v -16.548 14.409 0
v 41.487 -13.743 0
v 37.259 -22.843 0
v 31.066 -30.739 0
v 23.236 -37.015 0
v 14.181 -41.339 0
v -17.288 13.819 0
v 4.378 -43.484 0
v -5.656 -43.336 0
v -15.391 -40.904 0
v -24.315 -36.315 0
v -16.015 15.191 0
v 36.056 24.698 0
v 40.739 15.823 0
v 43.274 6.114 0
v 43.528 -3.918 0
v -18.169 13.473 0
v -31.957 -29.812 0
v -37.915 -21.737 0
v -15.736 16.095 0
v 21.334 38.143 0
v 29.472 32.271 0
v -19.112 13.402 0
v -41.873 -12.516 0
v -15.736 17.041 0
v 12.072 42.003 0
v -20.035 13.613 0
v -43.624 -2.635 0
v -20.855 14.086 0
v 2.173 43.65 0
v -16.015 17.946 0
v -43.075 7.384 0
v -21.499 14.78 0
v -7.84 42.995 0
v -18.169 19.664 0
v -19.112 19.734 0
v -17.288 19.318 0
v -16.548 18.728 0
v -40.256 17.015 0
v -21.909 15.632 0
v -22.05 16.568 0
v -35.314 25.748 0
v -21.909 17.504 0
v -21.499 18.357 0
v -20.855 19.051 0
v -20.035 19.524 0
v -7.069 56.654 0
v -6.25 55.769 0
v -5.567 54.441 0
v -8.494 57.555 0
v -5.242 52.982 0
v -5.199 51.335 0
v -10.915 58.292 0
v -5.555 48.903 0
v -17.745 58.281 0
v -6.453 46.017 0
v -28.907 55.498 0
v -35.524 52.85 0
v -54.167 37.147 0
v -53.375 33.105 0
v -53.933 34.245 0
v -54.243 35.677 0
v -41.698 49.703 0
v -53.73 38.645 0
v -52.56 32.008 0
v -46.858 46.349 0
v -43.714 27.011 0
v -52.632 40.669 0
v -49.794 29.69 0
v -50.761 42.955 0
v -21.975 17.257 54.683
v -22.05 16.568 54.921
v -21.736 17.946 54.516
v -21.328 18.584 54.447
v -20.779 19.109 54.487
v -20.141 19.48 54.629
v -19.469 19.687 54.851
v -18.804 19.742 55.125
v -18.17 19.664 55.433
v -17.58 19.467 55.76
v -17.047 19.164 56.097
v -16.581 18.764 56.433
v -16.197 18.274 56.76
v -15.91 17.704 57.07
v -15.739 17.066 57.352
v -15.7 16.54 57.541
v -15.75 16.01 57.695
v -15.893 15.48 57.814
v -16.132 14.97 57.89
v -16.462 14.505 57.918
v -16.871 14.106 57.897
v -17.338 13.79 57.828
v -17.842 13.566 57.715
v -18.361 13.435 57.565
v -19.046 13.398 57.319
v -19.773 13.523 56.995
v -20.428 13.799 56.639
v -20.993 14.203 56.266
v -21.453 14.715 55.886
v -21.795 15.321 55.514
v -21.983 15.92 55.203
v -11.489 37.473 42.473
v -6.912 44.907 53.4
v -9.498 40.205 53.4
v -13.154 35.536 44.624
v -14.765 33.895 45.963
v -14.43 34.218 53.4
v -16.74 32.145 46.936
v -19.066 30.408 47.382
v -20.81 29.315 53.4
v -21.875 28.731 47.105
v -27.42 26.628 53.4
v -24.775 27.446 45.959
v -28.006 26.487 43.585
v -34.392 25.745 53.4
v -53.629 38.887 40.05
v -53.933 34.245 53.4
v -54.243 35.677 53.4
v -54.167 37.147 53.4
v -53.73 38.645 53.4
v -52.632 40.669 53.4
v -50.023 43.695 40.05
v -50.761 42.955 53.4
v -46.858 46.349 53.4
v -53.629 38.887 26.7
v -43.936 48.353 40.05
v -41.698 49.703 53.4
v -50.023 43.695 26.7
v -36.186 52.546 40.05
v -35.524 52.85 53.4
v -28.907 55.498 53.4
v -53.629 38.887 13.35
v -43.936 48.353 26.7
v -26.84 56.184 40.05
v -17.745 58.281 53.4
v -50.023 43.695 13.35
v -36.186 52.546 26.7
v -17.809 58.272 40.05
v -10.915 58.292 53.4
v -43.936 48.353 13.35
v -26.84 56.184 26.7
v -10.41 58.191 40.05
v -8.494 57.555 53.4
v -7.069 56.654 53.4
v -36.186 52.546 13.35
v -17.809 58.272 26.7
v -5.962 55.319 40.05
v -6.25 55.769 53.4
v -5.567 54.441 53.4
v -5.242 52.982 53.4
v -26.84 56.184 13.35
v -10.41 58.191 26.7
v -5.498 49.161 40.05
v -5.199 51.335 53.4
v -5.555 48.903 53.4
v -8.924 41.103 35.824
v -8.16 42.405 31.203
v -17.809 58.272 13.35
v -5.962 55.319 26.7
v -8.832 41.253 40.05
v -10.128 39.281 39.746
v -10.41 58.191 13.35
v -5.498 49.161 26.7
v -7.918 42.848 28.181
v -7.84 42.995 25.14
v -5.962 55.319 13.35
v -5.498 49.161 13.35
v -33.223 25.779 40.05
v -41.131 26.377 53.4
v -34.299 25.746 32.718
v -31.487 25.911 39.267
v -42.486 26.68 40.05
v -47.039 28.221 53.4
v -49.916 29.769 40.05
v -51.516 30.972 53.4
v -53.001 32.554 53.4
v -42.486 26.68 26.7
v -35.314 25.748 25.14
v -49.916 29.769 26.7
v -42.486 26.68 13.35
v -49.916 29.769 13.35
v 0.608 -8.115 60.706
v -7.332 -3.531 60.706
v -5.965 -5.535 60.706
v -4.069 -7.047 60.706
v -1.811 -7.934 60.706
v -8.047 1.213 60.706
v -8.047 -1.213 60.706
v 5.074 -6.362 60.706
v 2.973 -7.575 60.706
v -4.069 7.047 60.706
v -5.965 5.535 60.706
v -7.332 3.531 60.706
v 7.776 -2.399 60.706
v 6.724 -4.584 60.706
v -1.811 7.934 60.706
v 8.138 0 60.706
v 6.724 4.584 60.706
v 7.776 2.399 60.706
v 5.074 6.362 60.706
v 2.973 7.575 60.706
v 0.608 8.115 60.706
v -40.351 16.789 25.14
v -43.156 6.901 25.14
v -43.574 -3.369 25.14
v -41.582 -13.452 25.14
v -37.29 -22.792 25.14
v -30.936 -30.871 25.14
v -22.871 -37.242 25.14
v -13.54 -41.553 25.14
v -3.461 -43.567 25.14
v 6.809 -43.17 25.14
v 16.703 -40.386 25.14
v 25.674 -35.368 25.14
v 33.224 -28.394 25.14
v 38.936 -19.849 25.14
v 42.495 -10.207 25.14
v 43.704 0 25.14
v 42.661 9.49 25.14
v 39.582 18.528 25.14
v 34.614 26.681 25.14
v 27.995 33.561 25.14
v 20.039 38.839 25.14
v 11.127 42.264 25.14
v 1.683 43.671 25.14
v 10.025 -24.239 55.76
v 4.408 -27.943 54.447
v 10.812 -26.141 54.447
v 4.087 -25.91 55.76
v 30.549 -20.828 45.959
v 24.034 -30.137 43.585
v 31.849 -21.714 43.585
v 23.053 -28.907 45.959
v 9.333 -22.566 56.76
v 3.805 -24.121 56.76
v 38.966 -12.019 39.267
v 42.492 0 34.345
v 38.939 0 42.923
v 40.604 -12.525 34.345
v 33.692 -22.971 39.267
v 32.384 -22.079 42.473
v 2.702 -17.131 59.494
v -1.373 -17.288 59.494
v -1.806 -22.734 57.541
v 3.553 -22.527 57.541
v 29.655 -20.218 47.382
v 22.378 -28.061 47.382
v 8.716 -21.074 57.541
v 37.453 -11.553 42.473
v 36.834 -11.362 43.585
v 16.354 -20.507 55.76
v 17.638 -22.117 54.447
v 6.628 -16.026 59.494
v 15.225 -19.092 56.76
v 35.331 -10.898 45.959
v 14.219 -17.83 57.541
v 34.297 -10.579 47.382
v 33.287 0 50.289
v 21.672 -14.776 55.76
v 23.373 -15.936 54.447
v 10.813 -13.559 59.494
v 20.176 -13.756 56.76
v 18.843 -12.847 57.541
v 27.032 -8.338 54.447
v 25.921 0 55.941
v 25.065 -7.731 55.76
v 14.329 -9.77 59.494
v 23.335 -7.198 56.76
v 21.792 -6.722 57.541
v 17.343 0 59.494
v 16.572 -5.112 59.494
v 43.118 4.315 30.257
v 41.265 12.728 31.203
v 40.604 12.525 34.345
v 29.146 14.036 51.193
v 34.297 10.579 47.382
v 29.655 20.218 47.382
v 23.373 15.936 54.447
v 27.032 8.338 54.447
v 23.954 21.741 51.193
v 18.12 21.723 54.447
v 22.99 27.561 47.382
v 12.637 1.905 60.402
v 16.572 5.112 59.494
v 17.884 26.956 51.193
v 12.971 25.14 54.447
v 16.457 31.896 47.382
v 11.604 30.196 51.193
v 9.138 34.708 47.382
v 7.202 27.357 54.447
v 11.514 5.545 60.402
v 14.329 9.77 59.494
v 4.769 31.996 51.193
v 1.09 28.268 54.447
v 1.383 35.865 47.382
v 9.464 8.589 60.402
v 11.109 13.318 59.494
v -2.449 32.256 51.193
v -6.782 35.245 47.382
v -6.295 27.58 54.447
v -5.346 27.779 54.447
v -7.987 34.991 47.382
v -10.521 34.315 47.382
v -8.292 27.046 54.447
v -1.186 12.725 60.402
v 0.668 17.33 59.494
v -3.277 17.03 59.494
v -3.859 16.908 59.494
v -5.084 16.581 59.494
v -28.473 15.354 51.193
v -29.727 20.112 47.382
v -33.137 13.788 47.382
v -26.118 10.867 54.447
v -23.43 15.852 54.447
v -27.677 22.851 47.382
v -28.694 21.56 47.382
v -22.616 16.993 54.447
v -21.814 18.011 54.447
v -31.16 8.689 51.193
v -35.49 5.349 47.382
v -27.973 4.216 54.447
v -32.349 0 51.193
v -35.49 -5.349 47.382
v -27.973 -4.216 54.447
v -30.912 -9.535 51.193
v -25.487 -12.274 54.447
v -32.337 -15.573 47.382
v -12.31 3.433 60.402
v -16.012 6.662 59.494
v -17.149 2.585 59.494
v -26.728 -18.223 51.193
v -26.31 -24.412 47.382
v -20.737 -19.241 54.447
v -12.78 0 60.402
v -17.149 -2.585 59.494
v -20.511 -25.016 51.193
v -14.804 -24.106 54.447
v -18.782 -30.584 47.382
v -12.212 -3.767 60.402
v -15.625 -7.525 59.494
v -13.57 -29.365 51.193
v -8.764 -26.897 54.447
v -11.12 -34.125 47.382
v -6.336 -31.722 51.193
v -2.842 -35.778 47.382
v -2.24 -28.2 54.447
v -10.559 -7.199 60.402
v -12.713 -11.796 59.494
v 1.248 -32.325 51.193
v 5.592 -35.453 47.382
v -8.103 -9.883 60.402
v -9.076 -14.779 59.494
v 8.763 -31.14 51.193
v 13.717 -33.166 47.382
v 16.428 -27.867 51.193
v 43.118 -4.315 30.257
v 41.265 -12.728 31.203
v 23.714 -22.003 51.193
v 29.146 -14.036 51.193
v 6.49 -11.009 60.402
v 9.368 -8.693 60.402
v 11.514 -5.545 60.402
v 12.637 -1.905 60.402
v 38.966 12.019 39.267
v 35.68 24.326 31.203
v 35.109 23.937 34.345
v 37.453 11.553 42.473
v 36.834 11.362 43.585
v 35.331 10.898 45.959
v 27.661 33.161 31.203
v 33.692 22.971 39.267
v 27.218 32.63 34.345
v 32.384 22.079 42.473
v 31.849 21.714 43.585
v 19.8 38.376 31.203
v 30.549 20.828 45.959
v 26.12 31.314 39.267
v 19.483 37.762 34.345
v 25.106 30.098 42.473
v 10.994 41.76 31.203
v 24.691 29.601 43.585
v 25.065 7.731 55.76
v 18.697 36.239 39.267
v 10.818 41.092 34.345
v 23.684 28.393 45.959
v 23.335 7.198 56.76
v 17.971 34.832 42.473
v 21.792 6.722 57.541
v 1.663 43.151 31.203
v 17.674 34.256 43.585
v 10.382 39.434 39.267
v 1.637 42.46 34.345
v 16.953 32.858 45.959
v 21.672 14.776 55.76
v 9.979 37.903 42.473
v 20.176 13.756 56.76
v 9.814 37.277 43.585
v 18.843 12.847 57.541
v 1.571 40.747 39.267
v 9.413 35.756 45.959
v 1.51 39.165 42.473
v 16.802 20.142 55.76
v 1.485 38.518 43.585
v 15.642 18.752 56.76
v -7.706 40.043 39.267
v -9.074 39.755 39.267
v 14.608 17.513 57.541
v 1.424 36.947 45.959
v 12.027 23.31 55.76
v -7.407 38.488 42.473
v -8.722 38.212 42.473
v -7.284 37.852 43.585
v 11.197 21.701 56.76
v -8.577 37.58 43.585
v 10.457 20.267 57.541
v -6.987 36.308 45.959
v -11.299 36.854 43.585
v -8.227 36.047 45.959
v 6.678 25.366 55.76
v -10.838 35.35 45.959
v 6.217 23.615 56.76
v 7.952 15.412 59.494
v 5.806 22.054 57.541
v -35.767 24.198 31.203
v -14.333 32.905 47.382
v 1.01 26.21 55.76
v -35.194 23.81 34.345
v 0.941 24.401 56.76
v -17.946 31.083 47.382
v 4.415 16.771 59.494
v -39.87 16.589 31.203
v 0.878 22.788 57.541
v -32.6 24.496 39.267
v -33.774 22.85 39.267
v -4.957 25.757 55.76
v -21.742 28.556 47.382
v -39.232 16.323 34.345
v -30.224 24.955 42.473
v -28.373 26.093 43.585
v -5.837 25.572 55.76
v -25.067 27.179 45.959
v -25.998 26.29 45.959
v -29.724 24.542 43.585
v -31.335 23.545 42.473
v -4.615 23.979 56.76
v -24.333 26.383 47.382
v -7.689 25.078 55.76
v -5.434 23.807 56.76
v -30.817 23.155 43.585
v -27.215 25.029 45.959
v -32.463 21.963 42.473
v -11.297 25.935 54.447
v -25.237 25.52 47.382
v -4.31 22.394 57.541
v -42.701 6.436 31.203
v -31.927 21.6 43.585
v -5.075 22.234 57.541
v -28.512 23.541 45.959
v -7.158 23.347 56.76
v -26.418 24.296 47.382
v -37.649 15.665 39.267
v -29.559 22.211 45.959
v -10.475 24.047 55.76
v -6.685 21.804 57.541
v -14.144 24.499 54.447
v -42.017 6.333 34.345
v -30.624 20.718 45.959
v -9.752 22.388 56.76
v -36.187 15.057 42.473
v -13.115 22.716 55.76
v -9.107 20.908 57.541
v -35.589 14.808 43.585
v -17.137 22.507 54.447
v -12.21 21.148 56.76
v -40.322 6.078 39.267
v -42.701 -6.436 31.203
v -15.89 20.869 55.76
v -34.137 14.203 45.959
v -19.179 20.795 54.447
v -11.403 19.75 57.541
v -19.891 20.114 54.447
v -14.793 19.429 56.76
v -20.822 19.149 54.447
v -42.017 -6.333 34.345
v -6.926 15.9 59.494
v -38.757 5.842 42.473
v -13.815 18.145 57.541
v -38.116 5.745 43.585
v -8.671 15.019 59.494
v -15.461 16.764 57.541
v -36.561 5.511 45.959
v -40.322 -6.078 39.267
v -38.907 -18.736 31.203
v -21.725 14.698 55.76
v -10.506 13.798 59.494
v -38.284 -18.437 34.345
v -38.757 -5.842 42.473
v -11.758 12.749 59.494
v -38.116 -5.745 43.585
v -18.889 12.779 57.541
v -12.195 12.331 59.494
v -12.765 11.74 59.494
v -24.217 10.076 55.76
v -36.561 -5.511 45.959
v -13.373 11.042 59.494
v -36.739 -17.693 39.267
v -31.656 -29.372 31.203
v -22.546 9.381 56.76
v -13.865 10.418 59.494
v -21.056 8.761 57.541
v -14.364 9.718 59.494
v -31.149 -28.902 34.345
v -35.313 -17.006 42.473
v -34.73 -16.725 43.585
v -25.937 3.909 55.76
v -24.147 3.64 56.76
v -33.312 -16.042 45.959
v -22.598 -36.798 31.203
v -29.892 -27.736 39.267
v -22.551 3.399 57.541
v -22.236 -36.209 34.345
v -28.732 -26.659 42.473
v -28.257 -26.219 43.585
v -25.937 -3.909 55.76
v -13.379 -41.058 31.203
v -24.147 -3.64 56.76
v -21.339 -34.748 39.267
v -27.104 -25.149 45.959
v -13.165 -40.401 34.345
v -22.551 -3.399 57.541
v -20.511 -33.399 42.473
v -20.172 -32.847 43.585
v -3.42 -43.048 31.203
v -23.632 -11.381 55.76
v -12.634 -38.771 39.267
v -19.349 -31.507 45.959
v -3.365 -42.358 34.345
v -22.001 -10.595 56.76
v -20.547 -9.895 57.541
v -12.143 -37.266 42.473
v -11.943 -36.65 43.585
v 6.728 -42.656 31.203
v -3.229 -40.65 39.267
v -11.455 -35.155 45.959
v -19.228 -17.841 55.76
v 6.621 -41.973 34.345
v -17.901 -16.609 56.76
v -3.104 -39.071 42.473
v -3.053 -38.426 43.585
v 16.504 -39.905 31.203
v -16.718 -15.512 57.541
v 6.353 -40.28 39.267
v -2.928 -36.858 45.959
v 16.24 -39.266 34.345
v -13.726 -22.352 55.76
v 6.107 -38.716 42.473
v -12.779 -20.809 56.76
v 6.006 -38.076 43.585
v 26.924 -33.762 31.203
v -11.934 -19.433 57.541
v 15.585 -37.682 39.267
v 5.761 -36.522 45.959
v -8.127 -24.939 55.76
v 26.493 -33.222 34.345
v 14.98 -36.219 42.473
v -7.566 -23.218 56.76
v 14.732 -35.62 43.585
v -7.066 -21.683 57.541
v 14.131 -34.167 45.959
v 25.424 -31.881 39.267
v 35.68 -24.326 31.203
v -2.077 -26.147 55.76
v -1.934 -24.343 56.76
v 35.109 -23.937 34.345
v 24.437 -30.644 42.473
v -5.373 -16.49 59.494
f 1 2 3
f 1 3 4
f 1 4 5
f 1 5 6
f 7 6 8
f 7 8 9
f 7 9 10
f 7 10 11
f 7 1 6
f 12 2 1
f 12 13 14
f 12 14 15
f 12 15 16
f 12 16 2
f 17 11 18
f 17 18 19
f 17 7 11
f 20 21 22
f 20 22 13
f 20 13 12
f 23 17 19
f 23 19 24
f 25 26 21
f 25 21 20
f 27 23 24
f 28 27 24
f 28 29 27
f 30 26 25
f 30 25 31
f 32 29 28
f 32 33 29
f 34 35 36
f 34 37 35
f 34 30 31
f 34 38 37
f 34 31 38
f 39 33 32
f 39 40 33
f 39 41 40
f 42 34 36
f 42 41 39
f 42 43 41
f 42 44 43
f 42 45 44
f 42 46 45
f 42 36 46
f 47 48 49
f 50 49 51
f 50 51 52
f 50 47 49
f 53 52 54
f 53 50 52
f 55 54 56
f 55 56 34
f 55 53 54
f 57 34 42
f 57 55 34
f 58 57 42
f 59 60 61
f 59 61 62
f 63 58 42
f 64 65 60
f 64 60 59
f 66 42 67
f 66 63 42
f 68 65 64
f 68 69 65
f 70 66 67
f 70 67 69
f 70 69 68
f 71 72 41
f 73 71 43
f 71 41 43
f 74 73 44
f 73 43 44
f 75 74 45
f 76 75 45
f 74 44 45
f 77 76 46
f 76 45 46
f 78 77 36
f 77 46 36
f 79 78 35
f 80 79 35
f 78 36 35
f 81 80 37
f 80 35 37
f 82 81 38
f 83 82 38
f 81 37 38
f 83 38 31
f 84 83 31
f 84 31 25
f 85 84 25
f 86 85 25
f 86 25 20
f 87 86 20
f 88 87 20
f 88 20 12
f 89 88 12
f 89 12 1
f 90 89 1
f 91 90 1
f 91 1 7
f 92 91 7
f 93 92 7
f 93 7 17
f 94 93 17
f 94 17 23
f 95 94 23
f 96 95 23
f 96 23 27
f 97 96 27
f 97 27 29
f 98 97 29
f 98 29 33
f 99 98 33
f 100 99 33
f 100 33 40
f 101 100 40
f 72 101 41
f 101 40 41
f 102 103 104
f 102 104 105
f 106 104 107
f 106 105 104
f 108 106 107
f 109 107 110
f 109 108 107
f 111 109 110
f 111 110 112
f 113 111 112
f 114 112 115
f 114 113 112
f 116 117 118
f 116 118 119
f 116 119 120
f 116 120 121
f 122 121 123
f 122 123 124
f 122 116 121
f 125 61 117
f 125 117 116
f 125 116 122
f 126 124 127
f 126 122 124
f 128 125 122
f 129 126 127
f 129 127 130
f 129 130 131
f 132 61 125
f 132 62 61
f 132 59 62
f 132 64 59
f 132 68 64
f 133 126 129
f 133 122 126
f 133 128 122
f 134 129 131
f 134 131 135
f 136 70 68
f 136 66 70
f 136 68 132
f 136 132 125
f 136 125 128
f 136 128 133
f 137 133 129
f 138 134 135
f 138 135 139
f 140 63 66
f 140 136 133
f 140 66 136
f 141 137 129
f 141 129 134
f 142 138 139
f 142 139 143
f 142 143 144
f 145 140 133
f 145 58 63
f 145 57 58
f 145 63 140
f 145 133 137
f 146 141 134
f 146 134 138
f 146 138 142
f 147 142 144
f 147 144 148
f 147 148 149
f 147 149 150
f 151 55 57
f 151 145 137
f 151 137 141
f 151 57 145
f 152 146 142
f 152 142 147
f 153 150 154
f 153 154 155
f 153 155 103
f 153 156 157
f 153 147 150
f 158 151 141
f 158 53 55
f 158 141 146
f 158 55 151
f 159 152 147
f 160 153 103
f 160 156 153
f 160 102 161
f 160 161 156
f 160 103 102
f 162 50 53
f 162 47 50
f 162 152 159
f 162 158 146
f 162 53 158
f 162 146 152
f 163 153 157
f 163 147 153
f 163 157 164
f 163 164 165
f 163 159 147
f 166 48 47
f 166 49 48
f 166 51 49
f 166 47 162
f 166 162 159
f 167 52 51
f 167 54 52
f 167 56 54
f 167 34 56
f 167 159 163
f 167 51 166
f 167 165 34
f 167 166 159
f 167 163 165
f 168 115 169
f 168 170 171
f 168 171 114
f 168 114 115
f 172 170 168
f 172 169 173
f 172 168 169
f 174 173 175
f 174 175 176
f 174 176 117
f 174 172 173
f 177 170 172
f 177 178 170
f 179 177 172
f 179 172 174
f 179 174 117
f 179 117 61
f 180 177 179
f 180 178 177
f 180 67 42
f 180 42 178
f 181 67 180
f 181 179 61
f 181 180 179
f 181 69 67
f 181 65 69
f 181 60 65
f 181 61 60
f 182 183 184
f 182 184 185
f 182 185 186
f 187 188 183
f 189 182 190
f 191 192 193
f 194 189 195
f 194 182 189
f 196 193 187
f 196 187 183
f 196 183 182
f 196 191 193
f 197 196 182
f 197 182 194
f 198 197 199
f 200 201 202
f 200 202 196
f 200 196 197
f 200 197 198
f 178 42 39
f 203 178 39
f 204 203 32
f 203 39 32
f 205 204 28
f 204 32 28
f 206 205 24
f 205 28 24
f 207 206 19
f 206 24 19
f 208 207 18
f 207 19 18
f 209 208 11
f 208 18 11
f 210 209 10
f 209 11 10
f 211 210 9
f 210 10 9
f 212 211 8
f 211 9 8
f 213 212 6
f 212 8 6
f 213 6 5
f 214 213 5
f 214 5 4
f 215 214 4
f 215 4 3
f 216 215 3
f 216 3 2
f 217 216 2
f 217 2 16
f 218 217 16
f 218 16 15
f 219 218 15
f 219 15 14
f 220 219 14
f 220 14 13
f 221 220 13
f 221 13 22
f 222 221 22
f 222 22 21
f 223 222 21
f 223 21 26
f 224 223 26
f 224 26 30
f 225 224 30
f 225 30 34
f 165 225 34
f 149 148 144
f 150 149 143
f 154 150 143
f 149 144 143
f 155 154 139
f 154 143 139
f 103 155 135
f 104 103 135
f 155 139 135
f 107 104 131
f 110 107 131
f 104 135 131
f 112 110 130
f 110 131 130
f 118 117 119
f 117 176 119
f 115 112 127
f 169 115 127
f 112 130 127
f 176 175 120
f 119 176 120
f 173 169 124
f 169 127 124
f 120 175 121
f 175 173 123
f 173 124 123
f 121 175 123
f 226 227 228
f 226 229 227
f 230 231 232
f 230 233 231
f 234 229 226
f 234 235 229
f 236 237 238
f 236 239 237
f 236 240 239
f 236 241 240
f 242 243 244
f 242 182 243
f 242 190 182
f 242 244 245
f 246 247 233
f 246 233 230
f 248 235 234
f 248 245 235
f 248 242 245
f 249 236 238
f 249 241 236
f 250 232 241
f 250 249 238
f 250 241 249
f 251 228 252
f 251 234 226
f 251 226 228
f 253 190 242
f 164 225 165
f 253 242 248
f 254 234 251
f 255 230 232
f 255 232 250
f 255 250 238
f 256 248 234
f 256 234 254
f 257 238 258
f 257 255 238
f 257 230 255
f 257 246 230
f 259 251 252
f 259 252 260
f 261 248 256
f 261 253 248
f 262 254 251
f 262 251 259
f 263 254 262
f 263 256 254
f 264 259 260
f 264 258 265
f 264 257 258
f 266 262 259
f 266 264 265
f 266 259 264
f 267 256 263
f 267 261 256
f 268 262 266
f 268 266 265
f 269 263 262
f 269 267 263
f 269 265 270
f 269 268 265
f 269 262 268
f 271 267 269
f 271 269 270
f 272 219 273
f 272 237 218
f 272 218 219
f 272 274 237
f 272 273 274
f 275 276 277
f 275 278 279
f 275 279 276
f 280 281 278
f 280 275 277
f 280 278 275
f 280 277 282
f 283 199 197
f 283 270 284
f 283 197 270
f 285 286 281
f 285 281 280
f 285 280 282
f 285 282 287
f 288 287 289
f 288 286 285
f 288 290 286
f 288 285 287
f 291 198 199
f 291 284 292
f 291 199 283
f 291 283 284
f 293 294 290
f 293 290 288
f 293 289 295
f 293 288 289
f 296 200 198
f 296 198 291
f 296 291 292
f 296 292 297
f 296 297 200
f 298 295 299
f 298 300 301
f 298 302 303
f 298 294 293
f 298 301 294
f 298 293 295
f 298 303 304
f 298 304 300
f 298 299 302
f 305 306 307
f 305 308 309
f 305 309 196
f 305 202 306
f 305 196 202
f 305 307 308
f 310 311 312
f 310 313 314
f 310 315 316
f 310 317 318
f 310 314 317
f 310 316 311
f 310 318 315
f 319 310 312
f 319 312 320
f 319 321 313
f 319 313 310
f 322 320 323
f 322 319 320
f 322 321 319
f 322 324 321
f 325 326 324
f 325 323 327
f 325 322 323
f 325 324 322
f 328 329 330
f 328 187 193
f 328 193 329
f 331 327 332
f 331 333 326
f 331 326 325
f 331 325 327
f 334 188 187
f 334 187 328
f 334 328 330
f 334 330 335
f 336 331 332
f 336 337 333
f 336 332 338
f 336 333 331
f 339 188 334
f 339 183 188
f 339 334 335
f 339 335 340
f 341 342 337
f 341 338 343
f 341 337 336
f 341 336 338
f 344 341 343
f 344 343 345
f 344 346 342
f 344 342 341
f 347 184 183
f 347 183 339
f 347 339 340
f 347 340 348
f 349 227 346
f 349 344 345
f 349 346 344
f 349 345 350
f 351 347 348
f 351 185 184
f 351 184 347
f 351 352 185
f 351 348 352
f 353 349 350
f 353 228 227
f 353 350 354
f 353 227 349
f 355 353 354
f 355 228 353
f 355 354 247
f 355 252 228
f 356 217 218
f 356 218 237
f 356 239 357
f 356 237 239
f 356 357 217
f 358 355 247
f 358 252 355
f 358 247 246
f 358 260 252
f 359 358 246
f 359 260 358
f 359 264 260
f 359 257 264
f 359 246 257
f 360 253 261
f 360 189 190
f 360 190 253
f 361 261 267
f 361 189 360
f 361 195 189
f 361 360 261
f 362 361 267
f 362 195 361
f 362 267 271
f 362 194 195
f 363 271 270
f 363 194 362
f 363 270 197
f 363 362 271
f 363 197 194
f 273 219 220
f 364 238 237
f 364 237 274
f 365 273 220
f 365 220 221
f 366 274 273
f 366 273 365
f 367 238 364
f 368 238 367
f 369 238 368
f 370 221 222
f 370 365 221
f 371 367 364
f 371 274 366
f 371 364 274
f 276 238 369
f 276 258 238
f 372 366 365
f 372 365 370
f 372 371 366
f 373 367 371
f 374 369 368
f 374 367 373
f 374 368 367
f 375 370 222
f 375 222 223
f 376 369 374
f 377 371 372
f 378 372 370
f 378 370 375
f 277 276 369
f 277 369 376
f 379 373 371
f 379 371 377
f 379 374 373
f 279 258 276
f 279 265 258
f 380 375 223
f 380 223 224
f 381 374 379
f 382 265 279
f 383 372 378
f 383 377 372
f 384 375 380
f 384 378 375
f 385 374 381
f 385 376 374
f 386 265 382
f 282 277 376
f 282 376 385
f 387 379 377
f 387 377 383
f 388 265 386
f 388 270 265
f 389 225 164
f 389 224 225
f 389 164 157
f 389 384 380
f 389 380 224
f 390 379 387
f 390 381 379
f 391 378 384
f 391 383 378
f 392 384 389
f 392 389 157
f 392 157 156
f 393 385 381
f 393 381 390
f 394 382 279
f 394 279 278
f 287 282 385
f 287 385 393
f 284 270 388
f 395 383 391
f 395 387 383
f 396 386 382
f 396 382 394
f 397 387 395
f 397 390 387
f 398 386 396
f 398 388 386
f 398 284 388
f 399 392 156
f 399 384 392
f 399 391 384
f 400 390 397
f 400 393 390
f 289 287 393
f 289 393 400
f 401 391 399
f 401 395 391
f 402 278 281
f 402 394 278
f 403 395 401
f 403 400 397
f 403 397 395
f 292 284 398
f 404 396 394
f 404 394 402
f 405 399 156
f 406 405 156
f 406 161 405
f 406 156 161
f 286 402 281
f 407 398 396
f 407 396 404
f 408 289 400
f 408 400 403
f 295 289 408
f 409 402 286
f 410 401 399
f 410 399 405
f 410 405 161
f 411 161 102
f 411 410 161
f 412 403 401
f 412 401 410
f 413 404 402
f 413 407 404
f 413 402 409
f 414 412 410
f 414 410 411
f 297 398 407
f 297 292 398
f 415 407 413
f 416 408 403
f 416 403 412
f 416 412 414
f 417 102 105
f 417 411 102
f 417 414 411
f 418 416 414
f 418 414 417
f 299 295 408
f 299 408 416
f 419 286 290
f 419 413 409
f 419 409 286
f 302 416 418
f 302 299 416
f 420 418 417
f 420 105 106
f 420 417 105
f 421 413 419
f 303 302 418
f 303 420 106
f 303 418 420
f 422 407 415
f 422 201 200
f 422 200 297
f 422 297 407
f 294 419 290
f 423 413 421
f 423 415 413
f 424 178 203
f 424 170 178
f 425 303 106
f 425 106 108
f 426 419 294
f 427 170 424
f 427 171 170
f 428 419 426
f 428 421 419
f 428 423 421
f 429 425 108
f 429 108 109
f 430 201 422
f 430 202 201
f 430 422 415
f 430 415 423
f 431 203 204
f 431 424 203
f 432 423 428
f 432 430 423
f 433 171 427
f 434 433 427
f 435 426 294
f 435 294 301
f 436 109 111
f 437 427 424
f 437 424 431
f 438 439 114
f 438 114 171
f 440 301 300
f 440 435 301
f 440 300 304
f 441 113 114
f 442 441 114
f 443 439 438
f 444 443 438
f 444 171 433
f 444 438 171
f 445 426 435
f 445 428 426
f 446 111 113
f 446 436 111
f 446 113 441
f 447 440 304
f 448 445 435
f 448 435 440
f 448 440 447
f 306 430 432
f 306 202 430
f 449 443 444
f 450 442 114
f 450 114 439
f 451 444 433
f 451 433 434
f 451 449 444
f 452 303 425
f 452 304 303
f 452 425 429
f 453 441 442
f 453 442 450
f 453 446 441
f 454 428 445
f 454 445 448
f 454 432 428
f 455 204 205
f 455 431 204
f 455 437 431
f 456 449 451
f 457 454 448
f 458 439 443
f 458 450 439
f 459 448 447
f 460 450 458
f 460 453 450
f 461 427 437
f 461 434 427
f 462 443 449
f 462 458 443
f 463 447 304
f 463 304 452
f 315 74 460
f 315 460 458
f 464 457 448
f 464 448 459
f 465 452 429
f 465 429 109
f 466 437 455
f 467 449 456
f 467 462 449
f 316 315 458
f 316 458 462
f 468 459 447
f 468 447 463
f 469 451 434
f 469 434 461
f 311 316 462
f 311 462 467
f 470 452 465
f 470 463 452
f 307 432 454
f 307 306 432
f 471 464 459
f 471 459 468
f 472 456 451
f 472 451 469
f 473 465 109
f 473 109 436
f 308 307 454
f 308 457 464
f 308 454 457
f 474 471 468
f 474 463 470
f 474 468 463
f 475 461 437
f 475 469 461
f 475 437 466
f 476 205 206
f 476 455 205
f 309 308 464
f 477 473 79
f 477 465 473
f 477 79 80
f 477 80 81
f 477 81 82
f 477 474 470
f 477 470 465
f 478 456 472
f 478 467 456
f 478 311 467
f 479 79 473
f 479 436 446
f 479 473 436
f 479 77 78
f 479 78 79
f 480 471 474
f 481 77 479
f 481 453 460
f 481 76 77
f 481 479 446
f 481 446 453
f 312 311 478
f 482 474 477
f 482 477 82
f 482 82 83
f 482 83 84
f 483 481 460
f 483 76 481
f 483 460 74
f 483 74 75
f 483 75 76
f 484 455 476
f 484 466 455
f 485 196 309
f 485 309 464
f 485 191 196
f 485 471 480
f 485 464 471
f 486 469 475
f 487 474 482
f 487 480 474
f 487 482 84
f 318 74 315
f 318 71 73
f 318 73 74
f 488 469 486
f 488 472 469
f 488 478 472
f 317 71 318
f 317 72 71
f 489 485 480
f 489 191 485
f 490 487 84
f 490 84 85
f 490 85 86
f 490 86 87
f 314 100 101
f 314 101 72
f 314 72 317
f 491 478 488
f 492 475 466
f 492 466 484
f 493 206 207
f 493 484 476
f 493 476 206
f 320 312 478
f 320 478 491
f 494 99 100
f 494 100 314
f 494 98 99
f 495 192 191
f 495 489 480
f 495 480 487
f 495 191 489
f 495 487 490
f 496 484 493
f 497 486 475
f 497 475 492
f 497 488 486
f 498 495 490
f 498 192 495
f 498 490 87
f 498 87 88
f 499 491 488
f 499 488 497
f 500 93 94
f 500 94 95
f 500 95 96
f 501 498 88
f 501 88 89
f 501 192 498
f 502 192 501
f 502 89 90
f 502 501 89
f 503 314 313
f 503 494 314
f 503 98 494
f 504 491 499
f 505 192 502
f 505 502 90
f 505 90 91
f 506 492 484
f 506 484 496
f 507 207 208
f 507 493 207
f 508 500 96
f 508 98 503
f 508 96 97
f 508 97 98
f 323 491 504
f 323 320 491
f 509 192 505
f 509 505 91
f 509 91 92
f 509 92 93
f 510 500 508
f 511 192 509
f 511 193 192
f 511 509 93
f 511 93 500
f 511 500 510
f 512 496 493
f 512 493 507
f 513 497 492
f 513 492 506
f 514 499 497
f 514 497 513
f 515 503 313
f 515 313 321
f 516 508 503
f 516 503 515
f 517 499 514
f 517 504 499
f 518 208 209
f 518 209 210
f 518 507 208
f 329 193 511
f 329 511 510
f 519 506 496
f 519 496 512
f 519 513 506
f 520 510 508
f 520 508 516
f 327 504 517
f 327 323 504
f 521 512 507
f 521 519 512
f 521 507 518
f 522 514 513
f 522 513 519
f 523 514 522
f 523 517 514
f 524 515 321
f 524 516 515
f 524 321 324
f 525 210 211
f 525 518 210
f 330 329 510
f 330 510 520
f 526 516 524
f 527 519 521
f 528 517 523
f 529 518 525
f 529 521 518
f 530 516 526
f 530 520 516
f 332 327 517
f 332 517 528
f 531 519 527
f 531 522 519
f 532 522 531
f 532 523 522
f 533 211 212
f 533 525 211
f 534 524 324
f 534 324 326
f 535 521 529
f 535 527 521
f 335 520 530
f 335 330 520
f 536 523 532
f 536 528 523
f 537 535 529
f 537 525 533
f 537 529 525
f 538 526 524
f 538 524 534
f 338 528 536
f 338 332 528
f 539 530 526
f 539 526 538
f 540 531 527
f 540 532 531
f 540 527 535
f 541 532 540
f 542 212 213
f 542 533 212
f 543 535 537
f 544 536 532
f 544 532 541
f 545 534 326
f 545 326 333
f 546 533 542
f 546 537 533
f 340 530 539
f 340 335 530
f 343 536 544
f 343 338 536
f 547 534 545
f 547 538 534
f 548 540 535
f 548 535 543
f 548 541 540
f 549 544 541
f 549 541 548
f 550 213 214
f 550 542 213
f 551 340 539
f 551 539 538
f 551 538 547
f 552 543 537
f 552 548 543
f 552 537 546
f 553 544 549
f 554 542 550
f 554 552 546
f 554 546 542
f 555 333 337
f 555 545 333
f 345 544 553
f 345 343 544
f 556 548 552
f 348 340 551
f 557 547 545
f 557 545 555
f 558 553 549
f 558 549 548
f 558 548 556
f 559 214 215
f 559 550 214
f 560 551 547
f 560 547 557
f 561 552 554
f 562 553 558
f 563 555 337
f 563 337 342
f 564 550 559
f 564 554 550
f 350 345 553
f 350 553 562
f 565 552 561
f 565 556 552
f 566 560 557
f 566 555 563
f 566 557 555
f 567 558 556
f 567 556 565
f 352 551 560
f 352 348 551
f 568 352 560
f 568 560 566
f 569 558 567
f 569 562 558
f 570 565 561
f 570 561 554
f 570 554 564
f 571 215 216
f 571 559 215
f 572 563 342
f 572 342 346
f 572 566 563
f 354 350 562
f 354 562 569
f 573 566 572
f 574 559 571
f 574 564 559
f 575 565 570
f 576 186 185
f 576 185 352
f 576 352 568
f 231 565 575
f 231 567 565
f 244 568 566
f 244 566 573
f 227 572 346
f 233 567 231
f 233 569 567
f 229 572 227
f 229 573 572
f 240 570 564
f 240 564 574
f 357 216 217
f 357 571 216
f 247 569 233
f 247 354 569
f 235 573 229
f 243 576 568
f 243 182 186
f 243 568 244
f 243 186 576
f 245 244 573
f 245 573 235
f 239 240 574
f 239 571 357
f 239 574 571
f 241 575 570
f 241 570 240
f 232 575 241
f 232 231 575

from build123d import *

# Parameters (mm, degrees)
F0_R     = 43.7038461673
F1_DEPTH = 60.706
F3_D     = 6.35
F6_DEPTH = 53.4


# Not quite as in the source:
# - a fillet or chamfer that OpenCascade refuses, or shapes differently, is made with other operations: its cross-section is extruded or revolved along the edge and cut away or added


with BuildPart() as f1:
    # F0 (on Top) → F1 (new body)
    with BuildSketch(Plane.XY):
        Circle(F0_R)
    extrude(amount=F1_DEPTH)

    # F3 (through all)
    with Locations(Plane.XY.offset(60.706)):
        with Locations((-18.8752301037, 16.5682565421)):
            Hole(F3_D / 2)

    # F4: fillet of radius 35.5661942009 on 1 edges, made by hand

    # F4_s1 → F4_t2 (revolve, cut)
    with BuildSketch(Plane.XZ):
        with BuildLine():
            ThreePointArc((43.7038461673, 25.1398057991), (33.2867490669, 50.2889028996), (8.1376519665, 60.706))
            Line((8.1376519665, 60.706), (43.7038461673, 60.706))
            Line((43.7038461673, 60.706), (43.7038461673, 25.1398057991))
        make_face()
    revolve(axis=Axis((0, 0, 60.706), (0, 0, 1)), mode=Mode.SUBTRACT)

    # F5 (on Top) → F6 (join)
    with BuildSketch(Plane.XY):
        with BuildLine():
            add(Edge.make_bspline(
                [(-53.932659328, 34.245159477), (-56.092631888, 40.1822694312), (-37.6274698884, 55.2882292442), (5.9776268015, 64.529029477), (-19.7151067113, 17.6140446523), (-51.5549907385, 27.7096691138), (-53.932659328, 34.245159477)],
                knots=[0, 0, 0, 0, 0.2312508113, 0.4835795296, 0.7454422336, 1, 1, 1, 1], degree=3))
        make_face()
    extrude(amount=F6_DEPTH)


solid = f1.part
